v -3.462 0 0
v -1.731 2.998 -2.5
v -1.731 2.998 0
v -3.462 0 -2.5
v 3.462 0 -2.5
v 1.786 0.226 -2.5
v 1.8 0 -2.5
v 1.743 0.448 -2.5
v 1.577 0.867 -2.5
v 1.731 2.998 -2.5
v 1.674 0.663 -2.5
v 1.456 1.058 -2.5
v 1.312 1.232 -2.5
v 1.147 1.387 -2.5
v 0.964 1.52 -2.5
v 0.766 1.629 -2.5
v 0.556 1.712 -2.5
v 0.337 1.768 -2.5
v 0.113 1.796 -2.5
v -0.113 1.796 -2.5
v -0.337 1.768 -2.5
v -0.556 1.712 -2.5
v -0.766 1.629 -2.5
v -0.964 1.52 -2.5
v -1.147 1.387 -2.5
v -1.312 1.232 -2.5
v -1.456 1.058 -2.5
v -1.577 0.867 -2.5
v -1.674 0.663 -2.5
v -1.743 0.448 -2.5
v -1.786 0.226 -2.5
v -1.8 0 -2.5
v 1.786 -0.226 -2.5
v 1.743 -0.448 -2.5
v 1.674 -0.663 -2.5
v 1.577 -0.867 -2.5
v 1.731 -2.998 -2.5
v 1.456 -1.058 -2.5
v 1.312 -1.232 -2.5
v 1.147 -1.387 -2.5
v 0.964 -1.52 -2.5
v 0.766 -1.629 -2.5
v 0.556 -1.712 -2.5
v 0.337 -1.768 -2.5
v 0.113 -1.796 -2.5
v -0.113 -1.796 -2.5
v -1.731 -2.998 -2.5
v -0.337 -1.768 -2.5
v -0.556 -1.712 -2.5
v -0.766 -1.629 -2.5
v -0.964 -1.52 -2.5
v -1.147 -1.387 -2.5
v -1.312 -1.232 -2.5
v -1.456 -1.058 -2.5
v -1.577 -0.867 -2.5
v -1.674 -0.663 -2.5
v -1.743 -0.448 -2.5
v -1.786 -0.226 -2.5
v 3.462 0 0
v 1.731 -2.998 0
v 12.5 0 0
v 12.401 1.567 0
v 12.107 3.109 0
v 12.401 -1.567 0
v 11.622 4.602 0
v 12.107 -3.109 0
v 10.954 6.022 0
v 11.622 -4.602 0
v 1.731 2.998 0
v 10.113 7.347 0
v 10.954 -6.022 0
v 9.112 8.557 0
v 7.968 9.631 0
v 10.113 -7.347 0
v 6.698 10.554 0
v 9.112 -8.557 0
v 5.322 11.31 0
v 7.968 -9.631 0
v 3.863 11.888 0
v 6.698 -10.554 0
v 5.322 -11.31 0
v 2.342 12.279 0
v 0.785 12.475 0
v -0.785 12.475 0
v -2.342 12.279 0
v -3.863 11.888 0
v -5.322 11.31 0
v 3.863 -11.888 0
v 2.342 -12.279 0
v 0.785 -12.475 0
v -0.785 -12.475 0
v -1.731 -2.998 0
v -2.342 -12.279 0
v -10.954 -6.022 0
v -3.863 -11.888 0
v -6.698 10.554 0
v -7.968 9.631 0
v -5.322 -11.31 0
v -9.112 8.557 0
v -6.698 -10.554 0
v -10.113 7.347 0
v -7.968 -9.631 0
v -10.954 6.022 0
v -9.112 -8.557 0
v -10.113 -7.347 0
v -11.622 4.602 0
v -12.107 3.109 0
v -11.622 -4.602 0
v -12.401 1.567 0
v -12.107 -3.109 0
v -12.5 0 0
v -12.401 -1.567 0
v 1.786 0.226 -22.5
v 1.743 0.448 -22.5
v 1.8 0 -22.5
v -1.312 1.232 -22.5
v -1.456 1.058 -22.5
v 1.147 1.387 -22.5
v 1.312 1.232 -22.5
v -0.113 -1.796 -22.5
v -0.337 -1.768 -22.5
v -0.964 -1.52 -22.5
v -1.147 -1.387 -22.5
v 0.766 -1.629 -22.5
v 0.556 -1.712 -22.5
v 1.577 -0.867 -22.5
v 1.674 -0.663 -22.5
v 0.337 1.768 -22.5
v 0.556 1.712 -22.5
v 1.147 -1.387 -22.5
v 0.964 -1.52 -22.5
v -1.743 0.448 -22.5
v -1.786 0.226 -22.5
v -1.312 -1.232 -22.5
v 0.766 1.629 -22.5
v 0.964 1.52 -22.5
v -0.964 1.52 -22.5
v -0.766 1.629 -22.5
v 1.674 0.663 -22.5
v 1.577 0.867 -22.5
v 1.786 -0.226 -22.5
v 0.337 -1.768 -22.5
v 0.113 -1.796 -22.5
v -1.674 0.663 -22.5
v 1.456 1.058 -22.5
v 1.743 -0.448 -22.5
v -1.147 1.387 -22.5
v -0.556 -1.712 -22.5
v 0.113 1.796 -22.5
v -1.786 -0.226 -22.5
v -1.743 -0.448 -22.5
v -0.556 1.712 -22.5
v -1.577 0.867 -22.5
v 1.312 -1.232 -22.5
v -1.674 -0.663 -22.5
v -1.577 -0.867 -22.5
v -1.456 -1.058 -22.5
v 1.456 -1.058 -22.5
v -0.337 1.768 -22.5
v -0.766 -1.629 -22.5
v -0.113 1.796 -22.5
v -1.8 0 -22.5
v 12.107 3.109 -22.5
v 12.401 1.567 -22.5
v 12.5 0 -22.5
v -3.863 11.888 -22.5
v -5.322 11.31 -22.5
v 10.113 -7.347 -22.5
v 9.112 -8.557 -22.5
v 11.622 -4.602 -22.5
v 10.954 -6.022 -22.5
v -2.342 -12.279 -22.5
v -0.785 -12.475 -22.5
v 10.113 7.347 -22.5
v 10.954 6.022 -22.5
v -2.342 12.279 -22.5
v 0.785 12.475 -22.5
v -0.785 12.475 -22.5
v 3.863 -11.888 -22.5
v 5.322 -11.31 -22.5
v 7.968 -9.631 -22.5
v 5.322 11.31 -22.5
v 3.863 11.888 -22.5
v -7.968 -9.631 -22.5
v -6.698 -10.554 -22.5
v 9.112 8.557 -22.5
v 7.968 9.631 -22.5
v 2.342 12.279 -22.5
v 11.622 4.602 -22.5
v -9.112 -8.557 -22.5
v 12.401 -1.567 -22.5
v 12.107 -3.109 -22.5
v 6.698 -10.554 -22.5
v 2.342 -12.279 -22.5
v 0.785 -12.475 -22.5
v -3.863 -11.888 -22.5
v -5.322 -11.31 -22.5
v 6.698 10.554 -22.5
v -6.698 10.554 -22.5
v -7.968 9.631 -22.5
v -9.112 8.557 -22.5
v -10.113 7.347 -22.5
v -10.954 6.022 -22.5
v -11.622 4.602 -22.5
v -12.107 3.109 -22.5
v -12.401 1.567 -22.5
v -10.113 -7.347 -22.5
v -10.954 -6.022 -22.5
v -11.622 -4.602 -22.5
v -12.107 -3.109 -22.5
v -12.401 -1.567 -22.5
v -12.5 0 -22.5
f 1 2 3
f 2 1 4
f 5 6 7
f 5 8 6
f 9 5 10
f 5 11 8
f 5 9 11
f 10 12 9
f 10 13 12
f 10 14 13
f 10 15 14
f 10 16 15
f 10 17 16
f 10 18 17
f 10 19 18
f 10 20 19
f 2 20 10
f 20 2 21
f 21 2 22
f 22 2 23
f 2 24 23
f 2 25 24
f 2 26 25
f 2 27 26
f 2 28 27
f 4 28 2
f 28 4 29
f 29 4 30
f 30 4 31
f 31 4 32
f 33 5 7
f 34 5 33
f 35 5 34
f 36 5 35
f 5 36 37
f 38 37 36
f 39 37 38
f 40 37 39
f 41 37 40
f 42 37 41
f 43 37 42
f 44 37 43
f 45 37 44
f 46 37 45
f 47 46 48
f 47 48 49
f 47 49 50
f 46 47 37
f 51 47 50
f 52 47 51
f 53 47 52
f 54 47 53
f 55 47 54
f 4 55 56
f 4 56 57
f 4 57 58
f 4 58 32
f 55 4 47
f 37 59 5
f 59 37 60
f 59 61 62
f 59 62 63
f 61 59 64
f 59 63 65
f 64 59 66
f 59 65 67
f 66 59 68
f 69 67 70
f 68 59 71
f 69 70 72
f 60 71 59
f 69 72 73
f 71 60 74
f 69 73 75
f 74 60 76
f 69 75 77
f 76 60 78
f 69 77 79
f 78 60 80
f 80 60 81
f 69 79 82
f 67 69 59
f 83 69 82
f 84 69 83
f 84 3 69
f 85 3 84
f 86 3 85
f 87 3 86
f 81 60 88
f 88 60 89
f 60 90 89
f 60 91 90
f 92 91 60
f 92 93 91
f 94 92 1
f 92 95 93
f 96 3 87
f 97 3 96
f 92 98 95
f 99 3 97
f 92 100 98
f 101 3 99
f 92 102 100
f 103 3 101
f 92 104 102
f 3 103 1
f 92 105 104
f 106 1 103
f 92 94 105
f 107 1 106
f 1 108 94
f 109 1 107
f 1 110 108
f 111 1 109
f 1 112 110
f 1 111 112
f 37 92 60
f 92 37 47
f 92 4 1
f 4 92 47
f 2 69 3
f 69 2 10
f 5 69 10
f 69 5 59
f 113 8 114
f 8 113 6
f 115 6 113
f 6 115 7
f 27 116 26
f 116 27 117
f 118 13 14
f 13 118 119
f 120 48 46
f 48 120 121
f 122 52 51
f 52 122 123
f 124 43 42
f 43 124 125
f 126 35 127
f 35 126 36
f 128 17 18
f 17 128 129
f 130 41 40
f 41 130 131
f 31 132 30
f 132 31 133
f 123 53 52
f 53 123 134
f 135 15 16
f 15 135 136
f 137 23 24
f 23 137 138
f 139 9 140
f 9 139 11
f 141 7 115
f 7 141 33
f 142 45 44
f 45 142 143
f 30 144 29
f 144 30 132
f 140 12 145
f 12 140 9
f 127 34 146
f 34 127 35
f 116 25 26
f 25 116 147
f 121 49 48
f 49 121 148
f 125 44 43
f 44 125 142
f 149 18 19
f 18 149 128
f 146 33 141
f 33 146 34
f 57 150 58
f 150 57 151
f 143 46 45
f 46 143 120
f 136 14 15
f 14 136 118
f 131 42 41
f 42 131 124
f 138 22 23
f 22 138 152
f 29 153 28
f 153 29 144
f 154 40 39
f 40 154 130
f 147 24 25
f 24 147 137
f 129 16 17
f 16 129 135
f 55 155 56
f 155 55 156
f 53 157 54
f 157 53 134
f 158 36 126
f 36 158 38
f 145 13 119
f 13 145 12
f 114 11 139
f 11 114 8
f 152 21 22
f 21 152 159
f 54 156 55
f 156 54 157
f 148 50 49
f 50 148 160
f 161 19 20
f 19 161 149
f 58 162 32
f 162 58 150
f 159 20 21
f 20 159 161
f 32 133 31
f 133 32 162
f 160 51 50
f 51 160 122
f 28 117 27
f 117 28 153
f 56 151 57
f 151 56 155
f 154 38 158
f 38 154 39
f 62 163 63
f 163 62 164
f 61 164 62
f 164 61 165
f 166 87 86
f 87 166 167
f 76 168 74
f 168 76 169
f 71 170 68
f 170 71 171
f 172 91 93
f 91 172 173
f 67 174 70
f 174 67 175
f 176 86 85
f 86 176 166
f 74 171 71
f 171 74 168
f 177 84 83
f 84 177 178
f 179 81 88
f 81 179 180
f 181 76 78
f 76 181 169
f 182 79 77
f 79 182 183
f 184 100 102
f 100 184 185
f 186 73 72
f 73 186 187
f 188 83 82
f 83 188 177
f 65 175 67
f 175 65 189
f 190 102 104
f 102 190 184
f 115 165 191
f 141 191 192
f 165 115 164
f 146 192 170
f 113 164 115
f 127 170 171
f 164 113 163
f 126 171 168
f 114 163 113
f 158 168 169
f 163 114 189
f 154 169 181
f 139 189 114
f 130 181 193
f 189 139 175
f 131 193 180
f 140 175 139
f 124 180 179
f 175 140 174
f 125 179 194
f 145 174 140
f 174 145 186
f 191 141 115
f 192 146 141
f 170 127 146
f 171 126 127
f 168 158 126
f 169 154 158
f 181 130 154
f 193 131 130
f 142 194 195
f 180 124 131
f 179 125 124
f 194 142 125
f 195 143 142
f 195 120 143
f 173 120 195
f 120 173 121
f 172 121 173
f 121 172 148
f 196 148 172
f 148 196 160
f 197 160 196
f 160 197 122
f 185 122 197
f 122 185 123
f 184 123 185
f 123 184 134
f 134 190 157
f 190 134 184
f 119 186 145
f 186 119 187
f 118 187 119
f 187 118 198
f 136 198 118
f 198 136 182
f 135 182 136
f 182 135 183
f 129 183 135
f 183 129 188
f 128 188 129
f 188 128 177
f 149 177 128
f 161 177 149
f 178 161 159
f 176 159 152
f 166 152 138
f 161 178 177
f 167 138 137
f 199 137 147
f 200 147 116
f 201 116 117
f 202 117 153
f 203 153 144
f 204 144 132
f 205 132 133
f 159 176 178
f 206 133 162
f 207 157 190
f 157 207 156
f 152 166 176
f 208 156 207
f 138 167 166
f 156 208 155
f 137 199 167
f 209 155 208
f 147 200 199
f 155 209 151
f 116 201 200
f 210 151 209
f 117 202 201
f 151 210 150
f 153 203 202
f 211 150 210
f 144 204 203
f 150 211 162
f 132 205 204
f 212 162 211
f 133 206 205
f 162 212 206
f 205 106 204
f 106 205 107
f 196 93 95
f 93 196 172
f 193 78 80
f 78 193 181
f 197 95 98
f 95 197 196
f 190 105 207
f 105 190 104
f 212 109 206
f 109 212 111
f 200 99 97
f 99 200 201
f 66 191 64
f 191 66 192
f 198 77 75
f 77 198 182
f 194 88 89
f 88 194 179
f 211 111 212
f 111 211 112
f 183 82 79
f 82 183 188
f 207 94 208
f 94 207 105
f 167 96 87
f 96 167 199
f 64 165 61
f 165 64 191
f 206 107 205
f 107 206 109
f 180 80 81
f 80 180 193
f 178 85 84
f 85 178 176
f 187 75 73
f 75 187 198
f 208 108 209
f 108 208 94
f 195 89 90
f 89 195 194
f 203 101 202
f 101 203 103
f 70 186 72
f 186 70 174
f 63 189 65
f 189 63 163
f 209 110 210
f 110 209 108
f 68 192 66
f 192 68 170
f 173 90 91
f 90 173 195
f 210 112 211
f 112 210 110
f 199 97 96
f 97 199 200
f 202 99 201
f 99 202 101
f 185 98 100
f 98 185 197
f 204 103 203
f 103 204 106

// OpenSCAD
$fn = 50;


difference() {
	union() {
		translate(v = [0, 0, -22.5000000000]) {
			cylinder(h = 22.5000000000, r = 12.5000000000);
		}
	}
	union() {
		translate(v = [0, 0, 0]) {
			rotate(a = [0, 0, 0]) {
				difference() {
					union() {
						translate(v = [0, 0, -2.5000000000]) {
							linear_extrude(height = 2.5000000000) {
								polygon(points = [[3.4620000000, 0.0000000000], [1.7310000000, 2.9981799479], [-1.7310000000, 2.9981799479], [-3.4620000000, 0.0000000000], [-1.7310000000, -2.9981799479], [1.7310000000, -2.9981799479]]);
							}
						}
					}
					union();
				}
			}
		}
		#translate(v = [0, 0, -100.0000000000]) {
			cylinder(h = 200, r = 1.8000000000);
		}
	}
}
